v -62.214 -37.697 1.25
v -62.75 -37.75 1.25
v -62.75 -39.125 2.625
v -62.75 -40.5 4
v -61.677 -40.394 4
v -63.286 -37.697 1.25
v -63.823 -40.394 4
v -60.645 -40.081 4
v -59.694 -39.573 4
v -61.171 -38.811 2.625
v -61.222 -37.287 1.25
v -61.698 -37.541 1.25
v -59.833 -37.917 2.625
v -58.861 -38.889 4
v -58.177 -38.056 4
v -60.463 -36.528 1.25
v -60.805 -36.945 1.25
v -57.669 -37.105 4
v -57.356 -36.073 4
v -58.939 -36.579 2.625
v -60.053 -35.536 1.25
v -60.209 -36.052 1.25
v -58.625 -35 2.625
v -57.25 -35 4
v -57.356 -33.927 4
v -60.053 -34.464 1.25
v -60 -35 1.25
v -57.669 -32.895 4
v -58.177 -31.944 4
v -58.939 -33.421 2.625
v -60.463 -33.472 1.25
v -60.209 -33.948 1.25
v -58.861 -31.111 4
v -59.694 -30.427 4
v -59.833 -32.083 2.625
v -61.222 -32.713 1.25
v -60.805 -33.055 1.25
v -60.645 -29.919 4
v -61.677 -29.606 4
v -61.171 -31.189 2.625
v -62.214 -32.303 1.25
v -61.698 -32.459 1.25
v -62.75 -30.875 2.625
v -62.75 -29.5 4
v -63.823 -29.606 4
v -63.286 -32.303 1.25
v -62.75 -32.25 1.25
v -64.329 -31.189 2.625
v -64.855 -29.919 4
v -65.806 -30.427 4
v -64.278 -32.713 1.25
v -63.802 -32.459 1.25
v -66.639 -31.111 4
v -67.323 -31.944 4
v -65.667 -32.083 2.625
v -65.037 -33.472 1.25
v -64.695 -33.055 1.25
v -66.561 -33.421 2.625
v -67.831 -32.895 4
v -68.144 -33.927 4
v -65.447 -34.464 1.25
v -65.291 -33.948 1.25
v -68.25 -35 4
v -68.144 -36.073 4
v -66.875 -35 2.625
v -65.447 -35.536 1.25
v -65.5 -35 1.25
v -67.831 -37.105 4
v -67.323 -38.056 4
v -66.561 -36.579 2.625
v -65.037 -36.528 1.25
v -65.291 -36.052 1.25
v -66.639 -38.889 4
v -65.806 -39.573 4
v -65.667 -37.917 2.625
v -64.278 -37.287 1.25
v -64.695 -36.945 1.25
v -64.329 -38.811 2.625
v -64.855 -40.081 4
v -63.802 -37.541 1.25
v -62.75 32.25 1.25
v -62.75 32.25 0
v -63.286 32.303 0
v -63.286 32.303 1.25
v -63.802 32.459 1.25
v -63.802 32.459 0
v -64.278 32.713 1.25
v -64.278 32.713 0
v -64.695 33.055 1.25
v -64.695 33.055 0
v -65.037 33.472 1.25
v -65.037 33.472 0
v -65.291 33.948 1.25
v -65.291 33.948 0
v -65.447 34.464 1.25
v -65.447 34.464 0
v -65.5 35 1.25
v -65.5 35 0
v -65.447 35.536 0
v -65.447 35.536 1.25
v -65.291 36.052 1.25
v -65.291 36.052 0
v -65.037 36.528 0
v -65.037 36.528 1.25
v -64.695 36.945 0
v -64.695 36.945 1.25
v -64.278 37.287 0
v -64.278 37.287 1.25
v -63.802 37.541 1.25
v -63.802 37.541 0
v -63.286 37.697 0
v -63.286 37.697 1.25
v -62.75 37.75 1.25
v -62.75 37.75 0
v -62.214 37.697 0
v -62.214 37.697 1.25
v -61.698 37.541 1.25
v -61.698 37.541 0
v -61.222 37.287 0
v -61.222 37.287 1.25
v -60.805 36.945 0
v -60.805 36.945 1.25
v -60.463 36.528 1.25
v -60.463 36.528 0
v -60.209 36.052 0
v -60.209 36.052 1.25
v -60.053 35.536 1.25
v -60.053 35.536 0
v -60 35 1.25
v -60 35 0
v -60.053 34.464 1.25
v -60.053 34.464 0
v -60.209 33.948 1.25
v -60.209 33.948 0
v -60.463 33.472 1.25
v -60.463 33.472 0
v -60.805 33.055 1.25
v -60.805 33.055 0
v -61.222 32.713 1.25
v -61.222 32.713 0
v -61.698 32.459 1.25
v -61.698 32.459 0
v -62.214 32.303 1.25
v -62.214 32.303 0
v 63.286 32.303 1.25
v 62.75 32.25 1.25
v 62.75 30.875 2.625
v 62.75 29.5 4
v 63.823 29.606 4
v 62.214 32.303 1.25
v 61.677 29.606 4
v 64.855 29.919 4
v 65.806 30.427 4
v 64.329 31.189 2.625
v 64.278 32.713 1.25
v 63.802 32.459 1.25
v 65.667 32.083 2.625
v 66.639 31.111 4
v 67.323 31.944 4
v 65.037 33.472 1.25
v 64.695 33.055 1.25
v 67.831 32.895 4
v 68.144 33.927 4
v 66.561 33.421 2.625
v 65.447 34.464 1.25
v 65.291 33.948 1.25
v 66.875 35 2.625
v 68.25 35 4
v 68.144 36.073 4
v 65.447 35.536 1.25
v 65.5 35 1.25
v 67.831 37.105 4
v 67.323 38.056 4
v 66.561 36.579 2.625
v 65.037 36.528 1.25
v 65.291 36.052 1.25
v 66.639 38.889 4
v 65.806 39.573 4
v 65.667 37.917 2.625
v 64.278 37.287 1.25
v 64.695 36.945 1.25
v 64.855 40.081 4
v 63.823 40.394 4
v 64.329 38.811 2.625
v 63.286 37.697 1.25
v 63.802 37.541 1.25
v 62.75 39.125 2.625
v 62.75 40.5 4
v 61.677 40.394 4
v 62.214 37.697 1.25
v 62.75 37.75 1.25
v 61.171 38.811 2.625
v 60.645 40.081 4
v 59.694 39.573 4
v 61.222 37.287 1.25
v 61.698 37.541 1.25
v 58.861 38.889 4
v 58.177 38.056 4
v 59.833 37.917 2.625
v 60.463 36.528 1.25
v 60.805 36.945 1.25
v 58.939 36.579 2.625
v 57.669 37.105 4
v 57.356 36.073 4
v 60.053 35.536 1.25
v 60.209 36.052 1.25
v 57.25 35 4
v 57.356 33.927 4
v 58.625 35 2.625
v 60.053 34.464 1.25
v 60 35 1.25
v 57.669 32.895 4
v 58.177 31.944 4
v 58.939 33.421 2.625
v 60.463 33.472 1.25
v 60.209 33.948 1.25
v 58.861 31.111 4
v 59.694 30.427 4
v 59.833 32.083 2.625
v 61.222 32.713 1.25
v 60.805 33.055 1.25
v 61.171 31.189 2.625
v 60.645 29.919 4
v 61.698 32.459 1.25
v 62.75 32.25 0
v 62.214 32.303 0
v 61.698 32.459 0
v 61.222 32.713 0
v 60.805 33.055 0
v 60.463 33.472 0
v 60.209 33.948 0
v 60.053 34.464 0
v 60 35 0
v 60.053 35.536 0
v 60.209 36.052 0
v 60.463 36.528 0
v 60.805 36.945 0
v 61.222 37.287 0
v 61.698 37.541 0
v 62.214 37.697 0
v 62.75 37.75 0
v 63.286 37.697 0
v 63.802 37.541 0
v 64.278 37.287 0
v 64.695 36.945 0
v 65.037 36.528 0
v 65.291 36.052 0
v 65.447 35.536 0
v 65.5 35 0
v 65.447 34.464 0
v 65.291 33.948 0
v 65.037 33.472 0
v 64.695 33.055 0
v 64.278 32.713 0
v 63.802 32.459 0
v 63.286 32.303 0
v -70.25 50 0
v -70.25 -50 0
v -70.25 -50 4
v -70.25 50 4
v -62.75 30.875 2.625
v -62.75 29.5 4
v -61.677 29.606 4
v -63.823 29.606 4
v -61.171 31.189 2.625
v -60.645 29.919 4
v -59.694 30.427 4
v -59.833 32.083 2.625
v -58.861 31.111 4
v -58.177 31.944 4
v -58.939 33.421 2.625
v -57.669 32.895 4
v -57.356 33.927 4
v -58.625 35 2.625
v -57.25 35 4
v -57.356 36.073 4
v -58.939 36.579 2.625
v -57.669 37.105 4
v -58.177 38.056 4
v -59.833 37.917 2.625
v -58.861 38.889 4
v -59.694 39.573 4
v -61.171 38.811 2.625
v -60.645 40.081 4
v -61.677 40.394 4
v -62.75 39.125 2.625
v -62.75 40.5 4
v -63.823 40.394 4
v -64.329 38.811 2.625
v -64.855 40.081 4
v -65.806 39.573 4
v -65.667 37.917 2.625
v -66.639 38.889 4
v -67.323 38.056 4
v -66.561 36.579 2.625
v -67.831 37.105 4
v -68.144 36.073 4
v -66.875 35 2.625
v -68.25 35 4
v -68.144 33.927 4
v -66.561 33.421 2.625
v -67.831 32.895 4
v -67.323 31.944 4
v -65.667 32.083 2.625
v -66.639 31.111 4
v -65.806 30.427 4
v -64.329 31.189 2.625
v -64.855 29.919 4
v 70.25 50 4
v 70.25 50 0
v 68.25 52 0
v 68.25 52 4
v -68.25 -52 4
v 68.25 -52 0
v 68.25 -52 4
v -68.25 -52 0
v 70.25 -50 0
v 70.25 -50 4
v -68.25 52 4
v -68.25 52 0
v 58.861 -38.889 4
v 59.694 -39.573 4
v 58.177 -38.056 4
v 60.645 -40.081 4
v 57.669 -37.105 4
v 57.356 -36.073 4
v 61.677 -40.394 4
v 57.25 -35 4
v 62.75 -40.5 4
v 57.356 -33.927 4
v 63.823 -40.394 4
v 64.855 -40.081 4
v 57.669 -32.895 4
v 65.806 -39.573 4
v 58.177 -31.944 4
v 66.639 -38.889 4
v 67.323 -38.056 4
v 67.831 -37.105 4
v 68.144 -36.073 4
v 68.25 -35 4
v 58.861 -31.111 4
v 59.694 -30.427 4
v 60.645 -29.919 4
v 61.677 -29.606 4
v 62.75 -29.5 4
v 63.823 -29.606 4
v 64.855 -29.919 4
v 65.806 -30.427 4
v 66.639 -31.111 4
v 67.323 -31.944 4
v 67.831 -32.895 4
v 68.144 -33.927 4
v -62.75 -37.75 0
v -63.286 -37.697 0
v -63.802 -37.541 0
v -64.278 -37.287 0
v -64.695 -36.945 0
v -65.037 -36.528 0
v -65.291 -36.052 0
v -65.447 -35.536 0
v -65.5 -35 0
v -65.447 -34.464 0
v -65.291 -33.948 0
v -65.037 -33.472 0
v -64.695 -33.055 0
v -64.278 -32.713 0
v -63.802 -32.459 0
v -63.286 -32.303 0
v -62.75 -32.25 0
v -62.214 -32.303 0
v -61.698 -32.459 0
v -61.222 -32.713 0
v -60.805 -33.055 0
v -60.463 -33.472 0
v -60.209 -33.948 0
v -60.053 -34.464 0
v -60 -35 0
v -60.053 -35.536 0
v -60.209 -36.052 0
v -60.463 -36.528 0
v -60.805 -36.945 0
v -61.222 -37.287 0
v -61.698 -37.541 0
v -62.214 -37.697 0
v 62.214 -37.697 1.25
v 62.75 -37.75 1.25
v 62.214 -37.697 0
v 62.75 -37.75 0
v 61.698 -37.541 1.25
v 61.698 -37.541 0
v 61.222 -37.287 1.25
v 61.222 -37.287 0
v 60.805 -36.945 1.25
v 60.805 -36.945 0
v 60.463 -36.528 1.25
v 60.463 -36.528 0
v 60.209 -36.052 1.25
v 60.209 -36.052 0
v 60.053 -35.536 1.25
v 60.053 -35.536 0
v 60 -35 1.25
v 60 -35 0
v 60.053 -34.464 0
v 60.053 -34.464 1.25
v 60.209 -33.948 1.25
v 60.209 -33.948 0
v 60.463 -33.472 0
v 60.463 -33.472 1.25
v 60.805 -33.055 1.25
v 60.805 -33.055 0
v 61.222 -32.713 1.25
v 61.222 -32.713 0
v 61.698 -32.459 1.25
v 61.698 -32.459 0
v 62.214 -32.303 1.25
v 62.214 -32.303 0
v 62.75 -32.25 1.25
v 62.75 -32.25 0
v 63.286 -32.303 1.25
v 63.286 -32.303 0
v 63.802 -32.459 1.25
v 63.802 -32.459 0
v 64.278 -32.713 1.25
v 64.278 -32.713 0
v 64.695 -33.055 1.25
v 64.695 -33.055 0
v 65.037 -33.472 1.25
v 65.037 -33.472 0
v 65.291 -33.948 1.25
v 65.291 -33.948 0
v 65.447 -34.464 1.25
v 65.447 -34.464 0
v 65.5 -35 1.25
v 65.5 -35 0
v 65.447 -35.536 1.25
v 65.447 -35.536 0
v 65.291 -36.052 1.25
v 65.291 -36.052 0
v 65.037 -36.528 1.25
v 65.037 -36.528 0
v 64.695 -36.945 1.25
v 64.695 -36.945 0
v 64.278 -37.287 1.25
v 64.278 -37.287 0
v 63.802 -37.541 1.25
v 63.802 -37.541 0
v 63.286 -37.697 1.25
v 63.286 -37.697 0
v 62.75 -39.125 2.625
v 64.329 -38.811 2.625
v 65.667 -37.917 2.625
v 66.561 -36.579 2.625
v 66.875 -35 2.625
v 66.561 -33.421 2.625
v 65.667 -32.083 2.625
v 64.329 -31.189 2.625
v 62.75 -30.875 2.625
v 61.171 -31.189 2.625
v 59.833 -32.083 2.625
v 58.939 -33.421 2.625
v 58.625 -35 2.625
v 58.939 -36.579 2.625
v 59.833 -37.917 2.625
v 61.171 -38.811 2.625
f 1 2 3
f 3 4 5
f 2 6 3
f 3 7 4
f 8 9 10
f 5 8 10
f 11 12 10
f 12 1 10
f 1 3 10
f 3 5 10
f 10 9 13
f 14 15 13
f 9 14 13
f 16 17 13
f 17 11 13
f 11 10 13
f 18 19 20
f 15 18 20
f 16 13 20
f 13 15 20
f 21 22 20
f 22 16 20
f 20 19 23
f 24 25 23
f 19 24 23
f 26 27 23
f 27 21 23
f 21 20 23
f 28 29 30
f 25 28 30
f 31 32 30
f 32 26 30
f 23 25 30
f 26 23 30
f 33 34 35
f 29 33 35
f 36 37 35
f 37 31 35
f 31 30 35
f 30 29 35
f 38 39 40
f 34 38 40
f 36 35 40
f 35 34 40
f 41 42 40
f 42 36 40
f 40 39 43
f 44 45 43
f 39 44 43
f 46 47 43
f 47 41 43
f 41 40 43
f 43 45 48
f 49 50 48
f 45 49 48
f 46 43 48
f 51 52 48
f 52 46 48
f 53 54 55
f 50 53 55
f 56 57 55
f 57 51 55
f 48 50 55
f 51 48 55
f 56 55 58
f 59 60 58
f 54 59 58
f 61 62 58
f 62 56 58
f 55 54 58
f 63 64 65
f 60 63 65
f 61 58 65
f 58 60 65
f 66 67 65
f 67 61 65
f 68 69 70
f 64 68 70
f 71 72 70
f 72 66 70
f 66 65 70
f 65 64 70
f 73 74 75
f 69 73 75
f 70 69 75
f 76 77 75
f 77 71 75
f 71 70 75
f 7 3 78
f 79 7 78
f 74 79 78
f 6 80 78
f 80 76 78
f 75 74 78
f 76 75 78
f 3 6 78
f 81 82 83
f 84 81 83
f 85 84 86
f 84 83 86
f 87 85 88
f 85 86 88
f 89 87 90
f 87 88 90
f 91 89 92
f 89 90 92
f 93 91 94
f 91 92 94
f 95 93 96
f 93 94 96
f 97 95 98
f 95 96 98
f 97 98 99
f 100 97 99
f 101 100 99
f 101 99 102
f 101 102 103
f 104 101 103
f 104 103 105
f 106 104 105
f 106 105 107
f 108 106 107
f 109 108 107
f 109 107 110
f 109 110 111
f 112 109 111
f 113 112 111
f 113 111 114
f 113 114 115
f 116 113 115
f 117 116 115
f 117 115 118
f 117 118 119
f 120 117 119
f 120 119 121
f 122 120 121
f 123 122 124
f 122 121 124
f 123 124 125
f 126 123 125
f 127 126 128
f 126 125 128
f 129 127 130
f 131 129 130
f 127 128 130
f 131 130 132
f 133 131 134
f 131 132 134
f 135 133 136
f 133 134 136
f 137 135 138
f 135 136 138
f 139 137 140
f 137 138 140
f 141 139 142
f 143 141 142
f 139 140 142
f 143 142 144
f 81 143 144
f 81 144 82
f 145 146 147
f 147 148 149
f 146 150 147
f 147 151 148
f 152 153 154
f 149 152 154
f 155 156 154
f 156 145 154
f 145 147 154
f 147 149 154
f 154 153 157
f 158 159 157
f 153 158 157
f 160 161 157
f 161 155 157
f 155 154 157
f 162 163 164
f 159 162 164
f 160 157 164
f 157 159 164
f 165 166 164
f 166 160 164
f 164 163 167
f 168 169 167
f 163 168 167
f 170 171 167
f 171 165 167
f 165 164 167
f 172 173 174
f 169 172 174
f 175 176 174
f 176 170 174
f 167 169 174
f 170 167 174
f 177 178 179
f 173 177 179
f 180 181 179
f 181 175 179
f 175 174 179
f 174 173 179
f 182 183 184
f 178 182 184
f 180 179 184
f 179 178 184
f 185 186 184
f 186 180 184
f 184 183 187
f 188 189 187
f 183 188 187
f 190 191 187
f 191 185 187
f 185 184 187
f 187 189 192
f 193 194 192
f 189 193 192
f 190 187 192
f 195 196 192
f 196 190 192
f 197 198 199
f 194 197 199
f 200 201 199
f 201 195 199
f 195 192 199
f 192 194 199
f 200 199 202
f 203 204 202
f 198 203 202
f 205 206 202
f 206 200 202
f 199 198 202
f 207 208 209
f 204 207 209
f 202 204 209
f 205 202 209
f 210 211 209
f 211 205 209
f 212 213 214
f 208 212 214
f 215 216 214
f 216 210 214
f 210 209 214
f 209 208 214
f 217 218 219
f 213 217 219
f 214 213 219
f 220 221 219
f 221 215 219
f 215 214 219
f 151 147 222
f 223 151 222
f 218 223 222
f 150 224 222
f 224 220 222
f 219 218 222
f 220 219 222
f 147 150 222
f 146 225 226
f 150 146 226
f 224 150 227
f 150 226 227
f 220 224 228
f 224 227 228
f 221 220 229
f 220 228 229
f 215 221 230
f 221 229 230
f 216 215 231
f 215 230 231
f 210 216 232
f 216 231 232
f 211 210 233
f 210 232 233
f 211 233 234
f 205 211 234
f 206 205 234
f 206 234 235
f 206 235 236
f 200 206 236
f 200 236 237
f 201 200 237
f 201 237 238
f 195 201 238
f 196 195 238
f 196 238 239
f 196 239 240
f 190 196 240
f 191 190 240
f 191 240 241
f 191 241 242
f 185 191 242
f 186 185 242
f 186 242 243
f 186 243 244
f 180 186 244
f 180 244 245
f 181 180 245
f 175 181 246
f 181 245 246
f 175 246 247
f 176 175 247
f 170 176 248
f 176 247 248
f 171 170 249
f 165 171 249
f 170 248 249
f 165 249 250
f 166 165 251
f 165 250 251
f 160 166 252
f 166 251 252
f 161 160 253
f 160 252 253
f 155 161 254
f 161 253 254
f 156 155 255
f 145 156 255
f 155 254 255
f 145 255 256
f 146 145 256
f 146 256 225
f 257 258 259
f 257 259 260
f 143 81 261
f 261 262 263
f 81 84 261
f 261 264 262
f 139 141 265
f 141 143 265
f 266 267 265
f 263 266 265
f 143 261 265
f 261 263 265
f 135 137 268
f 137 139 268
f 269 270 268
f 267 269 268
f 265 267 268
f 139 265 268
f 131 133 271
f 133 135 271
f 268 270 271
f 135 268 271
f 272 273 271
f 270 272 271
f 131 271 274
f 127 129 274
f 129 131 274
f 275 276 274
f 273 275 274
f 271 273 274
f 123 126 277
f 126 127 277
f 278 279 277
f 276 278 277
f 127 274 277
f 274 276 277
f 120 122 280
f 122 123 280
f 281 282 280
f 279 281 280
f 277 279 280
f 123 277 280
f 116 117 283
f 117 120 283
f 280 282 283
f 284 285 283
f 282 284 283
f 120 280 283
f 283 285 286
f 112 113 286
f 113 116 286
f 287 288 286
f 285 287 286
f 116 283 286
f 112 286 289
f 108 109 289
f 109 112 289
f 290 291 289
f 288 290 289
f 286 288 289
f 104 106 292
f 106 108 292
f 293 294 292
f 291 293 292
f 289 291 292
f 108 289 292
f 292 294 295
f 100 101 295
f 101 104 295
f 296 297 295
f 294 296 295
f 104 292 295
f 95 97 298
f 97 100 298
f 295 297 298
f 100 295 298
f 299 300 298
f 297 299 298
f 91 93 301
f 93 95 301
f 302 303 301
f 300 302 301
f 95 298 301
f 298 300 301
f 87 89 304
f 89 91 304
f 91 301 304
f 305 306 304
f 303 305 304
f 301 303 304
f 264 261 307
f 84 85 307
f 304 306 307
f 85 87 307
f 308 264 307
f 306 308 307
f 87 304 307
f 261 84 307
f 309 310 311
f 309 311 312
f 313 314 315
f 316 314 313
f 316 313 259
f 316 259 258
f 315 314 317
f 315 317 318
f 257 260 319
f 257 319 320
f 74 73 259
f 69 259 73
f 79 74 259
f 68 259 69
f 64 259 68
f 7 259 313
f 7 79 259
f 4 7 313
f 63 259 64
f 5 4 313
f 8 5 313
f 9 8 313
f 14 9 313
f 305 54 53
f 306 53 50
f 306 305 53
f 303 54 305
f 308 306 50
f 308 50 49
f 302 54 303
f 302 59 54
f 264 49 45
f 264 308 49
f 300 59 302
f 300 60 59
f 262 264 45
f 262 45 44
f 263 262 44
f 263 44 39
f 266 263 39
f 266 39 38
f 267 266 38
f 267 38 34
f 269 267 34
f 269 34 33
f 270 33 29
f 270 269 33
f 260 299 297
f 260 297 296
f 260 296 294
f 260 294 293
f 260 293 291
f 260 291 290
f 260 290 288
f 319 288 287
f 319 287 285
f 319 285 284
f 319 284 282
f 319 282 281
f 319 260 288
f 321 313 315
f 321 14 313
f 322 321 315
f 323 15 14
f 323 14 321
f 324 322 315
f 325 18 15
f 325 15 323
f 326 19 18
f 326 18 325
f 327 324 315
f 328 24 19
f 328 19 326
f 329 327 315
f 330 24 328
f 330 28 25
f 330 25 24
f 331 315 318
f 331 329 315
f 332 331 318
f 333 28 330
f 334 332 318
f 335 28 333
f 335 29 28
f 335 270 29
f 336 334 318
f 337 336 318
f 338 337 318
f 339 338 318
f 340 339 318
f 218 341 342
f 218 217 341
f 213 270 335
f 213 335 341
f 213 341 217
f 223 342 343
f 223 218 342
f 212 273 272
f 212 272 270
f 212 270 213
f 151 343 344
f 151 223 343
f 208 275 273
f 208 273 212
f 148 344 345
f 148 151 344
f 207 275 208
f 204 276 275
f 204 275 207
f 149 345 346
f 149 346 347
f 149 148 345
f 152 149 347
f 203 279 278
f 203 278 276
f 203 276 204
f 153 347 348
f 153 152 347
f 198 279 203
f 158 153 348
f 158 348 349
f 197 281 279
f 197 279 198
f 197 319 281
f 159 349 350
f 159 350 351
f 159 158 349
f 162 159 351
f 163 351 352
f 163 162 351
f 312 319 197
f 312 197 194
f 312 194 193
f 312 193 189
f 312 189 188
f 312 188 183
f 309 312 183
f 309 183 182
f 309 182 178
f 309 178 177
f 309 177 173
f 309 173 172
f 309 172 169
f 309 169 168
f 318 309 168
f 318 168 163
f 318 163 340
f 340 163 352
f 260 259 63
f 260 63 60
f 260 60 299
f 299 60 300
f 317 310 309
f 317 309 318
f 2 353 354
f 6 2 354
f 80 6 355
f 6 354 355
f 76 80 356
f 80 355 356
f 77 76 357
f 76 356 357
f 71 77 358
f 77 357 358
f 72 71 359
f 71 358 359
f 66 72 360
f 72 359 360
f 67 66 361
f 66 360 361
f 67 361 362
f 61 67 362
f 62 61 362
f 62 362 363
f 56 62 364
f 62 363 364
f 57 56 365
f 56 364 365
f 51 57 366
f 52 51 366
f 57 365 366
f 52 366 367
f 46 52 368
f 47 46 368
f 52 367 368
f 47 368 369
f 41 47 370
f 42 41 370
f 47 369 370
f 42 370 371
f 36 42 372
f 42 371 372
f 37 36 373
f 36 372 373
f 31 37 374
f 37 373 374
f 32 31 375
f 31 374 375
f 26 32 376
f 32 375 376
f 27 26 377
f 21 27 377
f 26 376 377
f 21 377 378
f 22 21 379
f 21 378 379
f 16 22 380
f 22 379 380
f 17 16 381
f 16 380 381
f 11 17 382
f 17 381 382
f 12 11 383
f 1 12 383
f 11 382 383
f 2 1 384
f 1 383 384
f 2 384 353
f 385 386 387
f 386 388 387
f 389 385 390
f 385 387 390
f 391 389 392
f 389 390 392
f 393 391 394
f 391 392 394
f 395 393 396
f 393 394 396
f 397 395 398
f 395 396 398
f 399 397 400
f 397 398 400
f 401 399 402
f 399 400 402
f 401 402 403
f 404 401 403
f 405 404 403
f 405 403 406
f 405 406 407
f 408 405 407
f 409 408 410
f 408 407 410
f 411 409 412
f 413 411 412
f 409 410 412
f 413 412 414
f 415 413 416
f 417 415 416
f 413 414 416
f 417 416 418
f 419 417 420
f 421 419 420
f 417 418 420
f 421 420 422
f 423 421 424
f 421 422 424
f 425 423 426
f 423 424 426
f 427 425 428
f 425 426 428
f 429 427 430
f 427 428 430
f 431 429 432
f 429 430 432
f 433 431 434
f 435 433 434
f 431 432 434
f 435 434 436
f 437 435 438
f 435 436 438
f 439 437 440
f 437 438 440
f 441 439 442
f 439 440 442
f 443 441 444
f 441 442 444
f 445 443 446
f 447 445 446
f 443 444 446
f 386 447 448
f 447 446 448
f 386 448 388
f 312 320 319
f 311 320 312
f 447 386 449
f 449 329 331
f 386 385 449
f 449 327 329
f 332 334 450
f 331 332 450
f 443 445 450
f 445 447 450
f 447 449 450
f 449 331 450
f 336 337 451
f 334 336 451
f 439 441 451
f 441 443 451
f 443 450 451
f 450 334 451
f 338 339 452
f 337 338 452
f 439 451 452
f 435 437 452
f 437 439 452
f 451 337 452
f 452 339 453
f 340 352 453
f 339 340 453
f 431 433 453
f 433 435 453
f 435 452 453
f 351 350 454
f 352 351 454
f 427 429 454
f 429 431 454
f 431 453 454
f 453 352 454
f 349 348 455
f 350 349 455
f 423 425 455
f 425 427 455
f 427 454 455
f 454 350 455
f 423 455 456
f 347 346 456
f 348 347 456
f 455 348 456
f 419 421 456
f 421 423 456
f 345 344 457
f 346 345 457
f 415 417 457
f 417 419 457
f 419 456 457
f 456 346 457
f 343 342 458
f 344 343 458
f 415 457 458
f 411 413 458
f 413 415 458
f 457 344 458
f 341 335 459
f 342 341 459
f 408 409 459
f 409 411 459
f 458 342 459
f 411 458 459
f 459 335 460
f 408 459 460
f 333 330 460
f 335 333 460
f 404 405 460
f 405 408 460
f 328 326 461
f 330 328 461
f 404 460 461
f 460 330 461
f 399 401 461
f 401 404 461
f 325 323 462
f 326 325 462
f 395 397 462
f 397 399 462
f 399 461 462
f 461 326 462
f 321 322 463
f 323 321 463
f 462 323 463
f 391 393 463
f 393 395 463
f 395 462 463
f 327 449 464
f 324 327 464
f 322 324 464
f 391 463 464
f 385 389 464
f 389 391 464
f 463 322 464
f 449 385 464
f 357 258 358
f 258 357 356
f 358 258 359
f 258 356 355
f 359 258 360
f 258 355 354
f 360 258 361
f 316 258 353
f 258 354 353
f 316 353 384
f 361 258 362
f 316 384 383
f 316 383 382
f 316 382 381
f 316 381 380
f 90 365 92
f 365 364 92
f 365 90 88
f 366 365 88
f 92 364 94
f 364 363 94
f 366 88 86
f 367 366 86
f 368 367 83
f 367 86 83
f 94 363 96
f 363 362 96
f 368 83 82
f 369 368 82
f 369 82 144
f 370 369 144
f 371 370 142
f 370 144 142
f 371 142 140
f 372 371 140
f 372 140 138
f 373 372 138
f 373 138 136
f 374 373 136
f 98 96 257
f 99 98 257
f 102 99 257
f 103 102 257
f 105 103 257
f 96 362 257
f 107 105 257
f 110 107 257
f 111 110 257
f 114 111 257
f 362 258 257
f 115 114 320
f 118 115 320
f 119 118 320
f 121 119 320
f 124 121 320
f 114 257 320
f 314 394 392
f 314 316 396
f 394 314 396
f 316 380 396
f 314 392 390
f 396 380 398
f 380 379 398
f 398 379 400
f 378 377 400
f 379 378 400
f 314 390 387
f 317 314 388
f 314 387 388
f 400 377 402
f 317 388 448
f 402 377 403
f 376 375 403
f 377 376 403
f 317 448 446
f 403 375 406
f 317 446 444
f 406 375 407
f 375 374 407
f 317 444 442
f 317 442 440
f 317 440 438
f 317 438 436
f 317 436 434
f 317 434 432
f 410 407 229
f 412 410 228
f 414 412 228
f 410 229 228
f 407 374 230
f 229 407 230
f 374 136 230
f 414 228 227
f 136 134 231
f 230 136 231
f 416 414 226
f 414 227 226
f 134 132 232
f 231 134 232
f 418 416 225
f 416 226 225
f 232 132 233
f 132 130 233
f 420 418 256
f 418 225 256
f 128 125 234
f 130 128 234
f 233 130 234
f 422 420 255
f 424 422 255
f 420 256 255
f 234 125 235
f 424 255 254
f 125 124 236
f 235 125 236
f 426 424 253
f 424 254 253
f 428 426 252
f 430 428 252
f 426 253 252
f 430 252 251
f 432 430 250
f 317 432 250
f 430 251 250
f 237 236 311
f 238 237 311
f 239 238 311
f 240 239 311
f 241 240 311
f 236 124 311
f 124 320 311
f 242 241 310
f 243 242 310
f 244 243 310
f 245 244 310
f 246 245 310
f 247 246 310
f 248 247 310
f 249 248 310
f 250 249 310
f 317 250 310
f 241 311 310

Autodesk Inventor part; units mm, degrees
ref_plane "YZ Plane" through (0, 0, 0) normal (1, 0, 0) x (0, 1, 0)
ref_plane "XZ Plane" through (0, 0, 0) normal (0, 1, 0) x (-1, 0, 0)
ref_plane "XY Plane" through (0, 0, 0) normal (0, 0, 1) x (1, 0, 0)
sketch "Sketch5" plane through (0, 0, 0) normal (0, 0, 1) x (1, 0, 0)
  line L0 (-70.25, 52) -> (70.25, 52)
  line L1 (70.25, 52) -> (70.25, -52)
  line L2 (70.25, -52) -> (-70.25, -52)
  line L3 (-70.25, -52) -> (-70.25, 52)
  point P0 (0, 0)
  point P1 (0, 52)
  point P2 (70.25, 0)
  dimension "d8" = 140.5
  dimension "d9" = 104
extrude "Extrusion5" add sketch "Sketch5" along normal blind 4
sketch "Sketch6" plane through (0, 0, 4) normal (0, 0, 1) x (1, 0, 0)
  circle A0 centre (-62.75, 35) radius 3
  circle A1 centre (-62.75, -35) radius 3
  circle A2 centre (62.75, 35) radius 3
  circle A3 centre (62.75, -35) radius 3
  line L0 (-70.25, 52) -> (-70.25, -52) projected
  line L1 (-70.25, -52) -> (70.25, -52) projected
  point P0 (0, 0)
  point P1 (0, 0)
  point P2 (0, -52)
  point P3 (-70.25, 0)
  dimension "d19" = 125.5
  dimension "d20" = 62.75
  dimension "d21" = 70
  dimension "d22" = 35
  dimension "d23" = 6
hole "Hole1" at (-62.75, 35, 4) at (62.75, 35, 4) at (62.75, -35, 4) at (-62.75, -35, 4) direction (0, 0, -1) diameter 5.5 end through all countersink diameter 11 countersink angle 90 clearance for "Countersunk Flat Head Screw DIN EN ISO 2009" size "M5" standard "DIN"
chamfer "Chamfer1" distance 2 angle 45 4 edges at (70.25, -52, 2) (70.25, 52, 2) (-70.25, 52, 2) (-70.25, -52, 2)
equation "\"d20\" = 0.5 * d19"
equation "\"d22\" = 0.5 * d21"
properties part number "BC-10023" material "Alumínio 7075"
